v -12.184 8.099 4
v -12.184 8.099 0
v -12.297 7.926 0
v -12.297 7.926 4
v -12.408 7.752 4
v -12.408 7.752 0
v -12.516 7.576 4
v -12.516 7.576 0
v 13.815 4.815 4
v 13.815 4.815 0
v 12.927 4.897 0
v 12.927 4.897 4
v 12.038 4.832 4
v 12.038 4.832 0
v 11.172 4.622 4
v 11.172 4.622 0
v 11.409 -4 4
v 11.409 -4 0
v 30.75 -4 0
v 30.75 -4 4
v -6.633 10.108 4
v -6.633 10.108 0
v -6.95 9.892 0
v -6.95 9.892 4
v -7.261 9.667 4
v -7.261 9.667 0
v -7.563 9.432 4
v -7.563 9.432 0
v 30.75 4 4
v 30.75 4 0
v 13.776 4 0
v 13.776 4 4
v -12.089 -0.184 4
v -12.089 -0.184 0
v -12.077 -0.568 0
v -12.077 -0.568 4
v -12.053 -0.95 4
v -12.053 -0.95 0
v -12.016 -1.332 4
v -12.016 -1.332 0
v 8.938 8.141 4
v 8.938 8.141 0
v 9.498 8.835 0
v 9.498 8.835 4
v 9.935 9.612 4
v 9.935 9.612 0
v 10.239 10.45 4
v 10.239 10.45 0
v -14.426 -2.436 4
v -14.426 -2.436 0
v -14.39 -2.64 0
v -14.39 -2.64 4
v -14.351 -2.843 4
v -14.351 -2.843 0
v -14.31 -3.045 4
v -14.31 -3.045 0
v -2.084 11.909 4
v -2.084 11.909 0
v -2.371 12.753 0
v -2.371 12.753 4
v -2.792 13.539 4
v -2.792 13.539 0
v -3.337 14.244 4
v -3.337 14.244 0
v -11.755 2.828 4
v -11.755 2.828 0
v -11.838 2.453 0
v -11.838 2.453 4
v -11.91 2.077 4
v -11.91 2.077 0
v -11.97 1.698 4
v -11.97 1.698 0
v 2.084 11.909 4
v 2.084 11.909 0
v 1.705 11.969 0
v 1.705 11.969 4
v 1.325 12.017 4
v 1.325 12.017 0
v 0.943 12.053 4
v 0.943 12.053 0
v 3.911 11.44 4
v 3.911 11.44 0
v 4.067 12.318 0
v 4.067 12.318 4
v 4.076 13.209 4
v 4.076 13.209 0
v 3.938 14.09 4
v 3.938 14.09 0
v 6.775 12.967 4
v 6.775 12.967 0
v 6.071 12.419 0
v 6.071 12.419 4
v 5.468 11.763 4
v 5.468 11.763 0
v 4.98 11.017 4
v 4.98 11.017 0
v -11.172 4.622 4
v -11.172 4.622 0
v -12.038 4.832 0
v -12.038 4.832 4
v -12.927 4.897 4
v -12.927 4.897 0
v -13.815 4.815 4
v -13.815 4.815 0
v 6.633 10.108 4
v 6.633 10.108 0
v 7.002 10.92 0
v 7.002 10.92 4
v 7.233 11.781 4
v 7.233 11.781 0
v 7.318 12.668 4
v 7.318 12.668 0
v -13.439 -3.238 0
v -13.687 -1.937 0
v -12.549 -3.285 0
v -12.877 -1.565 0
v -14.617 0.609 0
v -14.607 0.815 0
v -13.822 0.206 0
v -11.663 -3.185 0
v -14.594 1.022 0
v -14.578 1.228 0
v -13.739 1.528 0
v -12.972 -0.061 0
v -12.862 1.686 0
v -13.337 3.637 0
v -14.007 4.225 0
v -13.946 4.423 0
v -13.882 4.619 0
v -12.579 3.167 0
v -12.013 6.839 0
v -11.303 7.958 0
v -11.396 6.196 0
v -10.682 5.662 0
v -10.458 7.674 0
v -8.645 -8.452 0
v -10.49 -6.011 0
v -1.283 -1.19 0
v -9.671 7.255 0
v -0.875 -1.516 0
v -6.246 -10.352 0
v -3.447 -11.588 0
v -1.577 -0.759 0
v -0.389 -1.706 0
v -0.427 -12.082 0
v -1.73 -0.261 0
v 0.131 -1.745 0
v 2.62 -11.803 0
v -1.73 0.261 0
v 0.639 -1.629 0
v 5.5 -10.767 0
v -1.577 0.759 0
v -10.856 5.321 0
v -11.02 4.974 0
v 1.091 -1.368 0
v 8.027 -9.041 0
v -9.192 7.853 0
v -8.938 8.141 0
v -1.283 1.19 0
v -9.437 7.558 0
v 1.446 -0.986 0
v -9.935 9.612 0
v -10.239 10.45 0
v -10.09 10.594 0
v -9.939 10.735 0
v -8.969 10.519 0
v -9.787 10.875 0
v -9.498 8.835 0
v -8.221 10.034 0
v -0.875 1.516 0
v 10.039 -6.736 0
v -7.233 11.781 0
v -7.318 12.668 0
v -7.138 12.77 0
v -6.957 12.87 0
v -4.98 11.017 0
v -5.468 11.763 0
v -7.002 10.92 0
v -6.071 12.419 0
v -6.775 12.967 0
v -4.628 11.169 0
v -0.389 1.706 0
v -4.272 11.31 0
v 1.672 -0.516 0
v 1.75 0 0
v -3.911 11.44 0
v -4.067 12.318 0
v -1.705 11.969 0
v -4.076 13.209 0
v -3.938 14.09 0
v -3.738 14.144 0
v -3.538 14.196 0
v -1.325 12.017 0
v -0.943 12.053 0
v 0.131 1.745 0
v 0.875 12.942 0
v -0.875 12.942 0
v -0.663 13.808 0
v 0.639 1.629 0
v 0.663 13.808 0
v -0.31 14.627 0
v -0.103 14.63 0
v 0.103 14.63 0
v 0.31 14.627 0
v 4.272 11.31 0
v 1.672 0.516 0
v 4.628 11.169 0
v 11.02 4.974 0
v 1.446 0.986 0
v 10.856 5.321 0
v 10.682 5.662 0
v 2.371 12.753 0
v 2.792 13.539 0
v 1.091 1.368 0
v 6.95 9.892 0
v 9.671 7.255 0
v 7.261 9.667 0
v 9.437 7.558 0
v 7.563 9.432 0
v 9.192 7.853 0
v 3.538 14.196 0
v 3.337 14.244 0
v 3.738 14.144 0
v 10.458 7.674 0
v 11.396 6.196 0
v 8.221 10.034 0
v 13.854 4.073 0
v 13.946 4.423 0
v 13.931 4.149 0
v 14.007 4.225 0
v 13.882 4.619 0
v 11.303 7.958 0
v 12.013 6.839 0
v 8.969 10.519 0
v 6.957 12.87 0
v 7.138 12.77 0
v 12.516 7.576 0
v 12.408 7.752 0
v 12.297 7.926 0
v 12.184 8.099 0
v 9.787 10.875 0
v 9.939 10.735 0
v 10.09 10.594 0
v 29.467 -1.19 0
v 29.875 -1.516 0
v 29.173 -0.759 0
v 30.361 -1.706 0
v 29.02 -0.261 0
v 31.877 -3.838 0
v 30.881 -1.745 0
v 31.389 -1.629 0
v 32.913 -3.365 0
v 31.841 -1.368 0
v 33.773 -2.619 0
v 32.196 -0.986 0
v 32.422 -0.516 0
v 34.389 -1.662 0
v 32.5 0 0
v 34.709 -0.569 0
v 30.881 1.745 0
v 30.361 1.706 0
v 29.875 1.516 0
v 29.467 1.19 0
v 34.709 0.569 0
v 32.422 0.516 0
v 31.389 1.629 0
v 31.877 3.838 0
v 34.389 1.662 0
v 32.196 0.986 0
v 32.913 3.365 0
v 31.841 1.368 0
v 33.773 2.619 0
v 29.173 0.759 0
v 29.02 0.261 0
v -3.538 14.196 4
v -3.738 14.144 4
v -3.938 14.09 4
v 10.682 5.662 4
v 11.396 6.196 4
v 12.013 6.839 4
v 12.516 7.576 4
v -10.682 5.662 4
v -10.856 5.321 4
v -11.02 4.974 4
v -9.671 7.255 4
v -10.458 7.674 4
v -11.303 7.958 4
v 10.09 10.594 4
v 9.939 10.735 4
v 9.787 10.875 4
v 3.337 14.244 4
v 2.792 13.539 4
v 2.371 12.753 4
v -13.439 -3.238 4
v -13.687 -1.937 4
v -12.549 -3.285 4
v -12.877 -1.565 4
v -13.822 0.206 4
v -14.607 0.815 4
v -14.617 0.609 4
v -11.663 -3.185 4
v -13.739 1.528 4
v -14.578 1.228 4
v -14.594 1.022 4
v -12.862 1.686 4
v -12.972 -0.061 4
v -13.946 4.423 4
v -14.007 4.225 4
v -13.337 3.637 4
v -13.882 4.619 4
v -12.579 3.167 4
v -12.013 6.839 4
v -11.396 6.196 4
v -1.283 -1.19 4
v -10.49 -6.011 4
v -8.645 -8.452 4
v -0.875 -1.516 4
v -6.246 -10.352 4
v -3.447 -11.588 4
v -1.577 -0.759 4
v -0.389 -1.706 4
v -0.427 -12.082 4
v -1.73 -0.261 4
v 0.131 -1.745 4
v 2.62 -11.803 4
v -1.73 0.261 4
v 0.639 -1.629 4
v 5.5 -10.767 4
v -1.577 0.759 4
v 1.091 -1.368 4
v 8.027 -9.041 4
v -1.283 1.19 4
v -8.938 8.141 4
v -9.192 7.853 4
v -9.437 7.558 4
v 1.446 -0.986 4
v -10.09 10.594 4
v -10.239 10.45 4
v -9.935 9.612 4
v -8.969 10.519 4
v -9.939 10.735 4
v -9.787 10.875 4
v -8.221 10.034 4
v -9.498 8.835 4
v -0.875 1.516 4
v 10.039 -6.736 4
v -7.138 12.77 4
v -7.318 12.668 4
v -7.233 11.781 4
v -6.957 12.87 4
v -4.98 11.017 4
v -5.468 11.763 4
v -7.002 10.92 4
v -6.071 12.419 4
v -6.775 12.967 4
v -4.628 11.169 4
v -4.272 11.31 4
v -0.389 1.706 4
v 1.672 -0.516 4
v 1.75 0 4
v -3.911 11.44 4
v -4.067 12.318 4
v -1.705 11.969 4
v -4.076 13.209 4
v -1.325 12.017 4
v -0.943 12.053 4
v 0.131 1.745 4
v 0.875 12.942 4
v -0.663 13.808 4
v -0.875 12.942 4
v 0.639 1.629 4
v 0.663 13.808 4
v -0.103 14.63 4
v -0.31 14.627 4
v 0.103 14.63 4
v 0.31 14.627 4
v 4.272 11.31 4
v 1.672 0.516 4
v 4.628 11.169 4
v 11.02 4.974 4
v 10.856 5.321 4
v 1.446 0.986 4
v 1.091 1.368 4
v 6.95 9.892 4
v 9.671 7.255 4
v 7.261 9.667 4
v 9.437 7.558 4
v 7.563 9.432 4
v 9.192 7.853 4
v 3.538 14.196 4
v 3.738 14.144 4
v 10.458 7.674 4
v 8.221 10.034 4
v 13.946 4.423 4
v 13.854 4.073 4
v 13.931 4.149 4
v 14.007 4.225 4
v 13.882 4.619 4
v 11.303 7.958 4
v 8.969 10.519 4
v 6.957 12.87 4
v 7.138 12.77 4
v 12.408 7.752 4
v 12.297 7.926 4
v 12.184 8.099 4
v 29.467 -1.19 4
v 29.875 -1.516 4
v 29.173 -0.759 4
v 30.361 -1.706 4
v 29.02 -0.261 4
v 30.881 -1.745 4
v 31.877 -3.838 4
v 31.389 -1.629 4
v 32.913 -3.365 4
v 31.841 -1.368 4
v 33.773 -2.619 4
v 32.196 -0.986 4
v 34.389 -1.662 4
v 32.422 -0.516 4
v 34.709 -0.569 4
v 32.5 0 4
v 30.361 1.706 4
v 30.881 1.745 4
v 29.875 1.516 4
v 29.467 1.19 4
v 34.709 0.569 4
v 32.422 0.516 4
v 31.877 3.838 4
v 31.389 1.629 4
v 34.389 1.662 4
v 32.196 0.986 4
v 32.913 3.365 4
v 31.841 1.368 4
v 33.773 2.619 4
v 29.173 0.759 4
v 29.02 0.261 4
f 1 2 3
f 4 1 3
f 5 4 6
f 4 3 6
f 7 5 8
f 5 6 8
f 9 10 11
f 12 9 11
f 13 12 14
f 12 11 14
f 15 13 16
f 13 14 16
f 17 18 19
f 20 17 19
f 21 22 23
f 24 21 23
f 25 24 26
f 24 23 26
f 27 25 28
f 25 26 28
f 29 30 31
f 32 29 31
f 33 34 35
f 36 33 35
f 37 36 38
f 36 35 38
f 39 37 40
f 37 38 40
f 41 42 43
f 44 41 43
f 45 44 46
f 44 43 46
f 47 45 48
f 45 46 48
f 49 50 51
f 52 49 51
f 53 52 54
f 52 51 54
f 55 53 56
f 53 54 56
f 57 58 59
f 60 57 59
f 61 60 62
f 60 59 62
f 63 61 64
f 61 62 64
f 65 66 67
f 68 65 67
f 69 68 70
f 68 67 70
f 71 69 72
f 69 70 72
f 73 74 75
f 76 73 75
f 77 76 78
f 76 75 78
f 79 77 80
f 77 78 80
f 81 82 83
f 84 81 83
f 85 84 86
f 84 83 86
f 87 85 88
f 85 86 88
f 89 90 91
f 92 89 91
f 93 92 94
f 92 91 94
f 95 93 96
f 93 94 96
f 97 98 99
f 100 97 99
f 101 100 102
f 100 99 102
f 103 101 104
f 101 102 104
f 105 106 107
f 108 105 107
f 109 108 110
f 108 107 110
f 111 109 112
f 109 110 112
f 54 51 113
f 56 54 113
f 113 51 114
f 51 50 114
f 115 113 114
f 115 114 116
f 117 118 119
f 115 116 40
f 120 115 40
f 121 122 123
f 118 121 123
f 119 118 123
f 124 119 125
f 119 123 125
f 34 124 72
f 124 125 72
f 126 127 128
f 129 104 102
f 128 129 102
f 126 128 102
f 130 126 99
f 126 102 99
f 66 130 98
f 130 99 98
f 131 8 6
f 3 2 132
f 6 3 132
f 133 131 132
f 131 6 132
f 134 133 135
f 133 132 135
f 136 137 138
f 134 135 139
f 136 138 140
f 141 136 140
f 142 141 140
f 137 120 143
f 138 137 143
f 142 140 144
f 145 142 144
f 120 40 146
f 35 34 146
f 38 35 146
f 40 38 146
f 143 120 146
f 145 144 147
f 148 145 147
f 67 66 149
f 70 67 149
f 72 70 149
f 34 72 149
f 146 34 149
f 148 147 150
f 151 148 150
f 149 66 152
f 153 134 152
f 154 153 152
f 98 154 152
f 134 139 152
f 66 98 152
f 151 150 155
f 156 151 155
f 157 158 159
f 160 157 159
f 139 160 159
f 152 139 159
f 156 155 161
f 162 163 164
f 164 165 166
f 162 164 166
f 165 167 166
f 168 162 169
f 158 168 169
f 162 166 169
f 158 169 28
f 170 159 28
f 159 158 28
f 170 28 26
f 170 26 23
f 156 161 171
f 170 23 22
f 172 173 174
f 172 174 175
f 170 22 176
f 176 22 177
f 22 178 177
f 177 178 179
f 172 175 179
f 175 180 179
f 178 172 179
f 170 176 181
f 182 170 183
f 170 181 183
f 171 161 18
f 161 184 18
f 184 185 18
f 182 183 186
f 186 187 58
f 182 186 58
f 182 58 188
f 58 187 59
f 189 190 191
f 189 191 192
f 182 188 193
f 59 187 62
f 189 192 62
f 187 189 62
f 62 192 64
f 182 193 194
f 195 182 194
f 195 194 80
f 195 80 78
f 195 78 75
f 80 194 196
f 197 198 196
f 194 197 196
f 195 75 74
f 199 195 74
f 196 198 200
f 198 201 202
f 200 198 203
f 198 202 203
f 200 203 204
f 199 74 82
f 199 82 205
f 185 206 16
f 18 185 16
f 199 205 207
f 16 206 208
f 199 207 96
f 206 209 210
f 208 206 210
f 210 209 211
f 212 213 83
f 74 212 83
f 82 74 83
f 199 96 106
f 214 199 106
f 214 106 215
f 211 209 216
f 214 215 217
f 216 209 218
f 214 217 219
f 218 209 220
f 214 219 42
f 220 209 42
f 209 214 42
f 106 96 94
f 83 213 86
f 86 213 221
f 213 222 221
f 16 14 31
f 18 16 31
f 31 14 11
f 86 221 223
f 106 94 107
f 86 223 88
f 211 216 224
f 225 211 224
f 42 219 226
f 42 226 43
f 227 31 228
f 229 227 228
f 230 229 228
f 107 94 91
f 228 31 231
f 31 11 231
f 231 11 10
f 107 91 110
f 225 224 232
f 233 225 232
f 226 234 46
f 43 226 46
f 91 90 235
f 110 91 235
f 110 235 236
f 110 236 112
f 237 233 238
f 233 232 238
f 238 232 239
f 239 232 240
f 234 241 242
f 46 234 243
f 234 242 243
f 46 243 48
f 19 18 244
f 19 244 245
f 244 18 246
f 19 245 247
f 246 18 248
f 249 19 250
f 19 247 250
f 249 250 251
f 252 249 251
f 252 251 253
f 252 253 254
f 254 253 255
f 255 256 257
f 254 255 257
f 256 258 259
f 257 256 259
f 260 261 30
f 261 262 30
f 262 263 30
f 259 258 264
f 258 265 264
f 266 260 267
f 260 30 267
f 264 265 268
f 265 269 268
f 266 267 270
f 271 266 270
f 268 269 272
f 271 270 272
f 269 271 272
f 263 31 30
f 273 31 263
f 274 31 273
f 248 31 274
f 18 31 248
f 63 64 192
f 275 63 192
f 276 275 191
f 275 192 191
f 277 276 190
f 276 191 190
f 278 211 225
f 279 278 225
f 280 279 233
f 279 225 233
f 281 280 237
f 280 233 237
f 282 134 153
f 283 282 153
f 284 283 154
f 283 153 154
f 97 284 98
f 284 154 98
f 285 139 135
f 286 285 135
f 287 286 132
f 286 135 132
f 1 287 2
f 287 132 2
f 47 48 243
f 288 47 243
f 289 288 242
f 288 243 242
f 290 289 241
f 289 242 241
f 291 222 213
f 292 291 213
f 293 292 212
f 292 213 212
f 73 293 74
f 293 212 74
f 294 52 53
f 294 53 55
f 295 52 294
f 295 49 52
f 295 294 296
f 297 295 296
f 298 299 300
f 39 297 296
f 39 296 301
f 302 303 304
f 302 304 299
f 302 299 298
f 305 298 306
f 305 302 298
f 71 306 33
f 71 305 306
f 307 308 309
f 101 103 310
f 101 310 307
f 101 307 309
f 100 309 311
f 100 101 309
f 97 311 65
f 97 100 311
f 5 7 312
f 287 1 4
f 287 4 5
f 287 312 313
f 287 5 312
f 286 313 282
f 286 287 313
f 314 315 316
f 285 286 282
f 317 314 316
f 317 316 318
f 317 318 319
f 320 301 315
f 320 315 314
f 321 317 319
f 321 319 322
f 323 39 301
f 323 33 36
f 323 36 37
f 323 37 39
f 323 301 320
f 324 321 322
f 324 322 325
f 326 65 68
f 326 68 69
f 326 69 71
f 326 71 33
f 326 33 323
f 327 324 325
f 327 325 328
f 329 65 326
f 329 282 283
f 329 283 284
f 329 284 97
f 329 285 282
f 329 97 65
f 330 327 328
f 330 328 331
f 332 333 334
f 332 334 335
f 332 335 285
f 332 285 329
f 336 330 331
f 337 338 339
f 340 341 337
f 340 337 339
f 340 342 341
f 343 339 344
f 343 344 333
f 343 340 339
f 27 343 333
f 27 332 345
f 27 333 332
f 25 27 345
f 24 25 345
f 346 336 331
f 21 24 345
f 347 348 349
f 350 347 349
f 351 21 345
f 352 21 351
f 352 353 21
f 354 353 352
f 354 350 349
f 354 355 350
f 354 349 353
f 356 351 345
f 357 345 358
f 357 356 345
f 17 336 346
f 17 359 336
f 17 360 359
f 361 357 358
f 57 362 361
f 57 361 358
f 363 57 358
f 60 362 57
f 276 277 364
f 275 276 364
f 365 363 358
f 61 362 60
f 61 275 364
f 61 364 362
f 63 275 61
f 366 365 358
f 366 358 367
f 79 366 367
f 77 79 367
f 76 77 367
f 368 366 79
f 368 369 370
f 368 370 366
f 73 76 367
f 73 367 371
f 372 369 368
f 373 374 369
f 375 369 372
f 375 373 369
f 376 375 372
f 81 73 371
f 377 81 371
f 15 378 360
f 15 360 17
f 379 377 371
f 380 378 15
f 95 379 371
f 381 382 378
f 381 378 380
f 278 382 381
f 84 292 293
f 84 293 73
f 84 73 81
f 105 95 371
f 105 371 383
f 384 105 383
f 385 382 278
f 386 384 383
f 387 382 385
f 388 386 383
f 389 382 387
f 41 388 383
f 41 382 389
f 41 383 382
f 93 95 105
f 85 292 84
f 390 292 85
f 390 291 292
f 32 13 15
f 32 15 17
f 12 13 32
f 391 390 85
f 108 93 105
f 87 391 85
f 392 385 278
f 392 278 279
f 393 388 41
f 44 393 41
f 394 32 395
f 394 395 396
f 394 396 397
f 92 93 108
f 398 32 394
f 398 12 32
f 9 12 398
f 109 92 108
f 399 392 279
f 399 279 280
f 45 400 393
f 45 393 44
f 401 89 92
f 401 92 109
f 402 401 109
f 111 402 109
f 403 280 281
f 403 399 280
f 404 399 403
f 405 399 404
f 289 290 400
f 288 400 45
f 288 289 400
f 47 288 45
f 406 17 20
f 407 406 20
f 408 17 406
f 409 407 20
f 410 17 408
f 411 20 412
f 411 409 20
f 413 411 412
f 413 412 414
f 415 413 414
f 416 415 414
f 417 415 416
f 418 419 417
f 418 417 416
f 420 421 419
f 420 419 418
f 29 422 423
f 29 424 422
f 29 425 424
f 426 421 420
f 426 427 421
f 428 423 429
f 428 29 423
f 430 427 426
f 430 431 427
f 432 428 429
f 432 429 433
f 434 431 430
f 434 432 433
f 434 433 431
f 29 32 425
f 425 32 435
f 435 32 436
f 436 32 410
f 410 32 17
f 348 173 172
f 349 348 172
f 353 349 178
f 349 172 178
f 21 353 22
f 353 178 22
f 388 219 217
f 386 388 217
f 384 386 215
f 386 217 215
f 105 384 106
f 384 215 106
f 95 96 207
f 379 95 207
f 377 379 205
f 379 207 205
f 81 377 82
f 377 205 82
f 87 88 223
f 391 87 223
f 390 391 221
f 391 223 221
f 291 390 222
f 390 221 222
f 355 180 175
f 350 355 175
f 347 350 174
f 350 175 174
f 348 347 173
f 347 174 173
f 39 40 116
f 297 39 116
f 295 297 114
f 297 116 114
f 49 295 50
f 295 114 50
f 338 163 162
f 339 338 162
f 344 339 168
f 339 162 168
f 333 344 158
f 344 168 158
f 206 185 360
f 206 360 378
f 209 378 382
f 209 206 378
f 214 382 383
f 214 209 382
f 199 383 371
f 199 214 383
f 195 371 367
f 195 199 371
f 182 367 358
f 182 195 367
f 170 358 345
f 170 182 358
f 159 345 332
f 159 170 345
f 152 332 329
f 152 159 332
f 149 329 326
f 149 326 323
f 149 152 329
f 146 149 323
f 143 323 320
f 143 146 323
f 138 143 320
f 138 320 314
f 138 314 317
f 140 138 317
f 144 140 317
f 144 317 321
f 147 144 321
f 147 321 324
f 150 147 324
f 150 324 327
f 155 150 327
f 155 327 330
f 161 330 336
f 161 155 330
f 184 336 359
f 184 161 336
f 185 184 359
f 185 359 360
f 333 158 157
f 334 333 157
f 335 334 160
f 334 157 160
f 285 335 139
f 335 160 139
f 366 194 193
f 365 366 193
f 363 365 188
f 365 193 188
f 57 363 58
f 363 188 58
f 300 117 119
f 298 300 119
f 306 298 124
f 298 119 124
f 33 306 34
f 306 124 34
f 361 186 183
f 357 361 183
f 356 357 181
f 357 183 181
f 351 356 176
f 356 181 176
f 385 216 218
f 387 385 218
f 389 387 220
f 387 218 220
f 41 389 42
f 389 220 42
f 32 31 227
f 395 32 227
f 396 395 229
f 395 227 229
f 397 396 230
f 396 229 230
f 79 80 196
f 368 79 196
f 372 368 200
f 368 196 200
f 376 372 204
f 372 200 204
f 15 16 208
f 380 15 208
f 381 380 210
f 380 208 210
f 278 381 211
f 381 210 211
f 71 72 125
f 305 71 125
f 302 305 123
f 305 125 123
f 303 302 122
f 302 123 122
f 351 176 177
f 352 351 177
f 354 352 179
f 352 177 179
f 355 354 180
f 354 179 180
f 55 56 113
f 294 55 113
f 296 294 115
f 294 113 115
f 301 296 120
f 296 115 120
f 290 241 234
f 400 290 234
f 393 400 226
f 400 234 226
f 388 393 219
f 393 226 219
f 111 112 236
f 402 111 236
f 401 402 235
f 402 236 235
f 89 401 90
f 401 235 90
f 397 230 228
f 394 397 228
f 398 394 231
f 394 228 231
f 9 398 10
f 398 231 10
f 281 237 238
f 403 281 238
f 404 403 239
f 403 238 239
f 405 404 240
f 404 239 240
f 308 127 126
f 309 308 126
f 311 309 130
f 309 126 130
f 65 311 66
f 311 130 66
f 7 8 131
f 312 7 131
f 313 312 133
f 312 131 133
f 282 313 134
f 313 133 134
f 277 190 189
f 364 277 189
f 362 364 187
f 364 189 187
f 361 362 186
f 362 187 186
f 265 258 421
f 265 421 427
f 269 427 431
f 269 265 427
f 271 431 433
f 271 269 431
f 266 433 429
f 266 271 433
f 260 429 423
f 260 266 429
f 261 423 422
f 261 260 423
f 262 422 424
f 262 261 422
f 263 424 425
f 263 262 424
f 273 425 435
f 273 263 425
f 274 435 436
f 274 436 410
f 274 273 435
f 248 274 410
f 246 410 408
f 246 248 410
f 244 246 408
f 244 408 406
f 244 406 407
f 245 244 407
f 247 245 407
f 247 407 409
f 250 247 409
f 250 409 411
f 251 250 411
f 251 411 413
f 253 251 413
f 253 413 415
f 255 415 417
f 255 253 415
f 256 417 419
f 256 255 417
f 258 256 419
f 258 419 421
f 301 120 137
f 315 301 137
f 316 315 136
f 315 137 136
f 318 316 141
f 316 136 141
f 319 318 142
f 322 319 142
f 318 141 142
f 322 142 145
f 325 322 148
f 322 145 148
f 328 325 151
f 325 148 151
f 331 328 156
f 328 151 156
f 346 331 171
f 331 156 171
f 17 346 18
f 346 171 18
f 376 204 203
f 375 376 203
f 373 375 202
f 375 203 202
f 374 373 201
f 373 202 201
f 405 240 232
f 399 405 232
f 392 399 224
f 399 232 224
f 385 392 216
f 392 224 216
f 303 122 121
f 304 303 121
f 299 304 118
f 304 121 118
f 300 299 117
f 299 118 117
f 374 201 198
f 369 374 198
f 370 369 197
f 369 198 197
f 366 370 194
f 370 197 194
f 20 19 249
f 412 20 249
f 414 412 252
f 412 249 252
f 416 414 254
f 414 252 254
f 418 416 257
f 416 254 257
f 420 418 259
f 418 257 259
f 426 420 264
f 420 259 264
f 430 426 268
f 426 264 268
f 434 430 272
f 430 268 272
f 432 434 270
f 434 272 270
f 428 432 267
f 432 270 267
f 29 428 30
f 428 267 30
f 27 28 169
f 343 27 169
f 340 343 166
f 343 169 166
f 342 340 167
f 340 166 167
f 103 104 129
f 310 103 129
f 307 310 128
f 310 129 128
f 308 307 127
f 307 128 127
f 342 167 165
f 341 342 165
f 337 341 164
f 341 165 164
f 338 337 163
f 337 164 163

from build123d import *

# Parameters (mm, degrees)
SKETCH1_R           = 1.75
BOSS_EXTRUDE1_DEPTH = 4


with BuildPart() as part:
    # Sketch1 → Boss-Extrude1 (new body)
    with BuildSketch(Plane.XY):
        with BuildLine():
            ThreePointArc((13.776114953, 4), (13.893050478, 4.110818553), (14.006628151, 4.225076075))
            ThreePointArc((14.006628151, 4.225076075), (13.913956833, 4.520918628), (13.815037615, 4.814731115))
            ThreePointArc((13.815037615, 4.814731115), (12.481386111, 4.882828881), (11.171803009, 4.621570895))
            ThreePointArc((11.171803009, 4.621570895), (10.939359064, 5.147671635), (10.682156823, 5.662122005))
            ThreePointArc((10.682156823, 5.662122005), (11.718219248, 6.50464102), (12.515850479, 7.575644315))
            ThreePointArc((12.515850479, 7.575644315), (12.35251755, 7.839146011), (12.183637866, 8.099127629))
            ThreePointArc((12.183637866, 8.099127629), (10.874950252, 7.833420336), (9.671482329, 7.254690176))
            ThreePointArc((9.671482329, 7.254690176), (9.315505105, 7.706456036), (8.938444741, 8.140780406))
            ThreePointArc((8.938444741, 8.140780406), (9.7324314, 9.214488384), (10.238655891, 10.450206961))
            ThreePointArc((10.238655891, 10.450206961), (10.01492416, 10.664811019), (9.786695342, 10.874626167))
            ThreePointArc((9.786695342, 10.874626167), (8.585201272, 10.291809183), (7.563466846, 9.431970593))
            ThreePointArc((7.563466846, 9.431970593), (7.1063237, 9.781015462), (6.633097302, 10.107923633))
            ThreePointArc((6.633097302, 10.107923633), (7.135119095, 11.345355554), (7.318128899, 12.668144672))
            ThreePointArc((7.318128899, 12.668144672), (7.048056252, 12.820366729), (6.774818757, 12.966831949))
            ThreePointArc((6.774818757, 12.966831949), (5.756012523, 12.103525808), (4.980210924, 11.016605609))
            ThreePointArc((4.980210924, 11.016605609), (4.450625842, 11.240997714), (3.910967965, 11.439948845))
            ThreePointArc((3.910967965, 11.439948845), (4.089481015, 12.763352309), (3.937776954, 14.090096262))
            ThreePointArc((3.937776954, 14.090096262), (3.638333049, 14.170371647), (3.337255394, 14.244283992))
            ThreePointArc((3.337255394, 14.244283992), (2.565152337, 13.154733392), (2.084030034, 11.909026779))
            ThreePointArc((2.084030034, 11.909026779), (1.515278794, 11.994666739), (0.943098128, 12.053159997))
            ThreePointArc((0.943098128, 12.053159997), (0.786885803, 13.379380698), (0.31, 14.626715284))
            ThreePointArc((0.31, 14.626715284), (0, 14.63), (-0.31, 14.626715284))
            ThreePointArc((-0.31, 14.626715284), (-0.786885803, 13.379380698), (-0.943098128, 12.053159997))
            ThreePointArc((-0.943098128, 12.053159997), (-1.515278794, 11.994666739), (-2.084030034, 11.909026779))
            ThreePointArc((-2.084030034, 11.909026779), (-2.565152337, 13.154733392), (-3.337255394, 14.244283992))
            ThreePointArc((-3.337255394, 14.244283992), (-3.638333049, 14.170371647), (-3.937776954, 14.090096262))
            ThreePointArc((-3.937776954, 14.090096262), (-4.089481015, 12.763352309), (-3.910967965, 11.439948845))
            ThreePointArc((-3.910967965, 11.439948845), (-4.450625842, 11.240997714), (-4.980210924, 11.016605609))
            ThreePointArc((-4.980210924, 11.016605609), (-5.756012523, 12.103525808), (-6.774818757, 12.966831949))
            ThreePointArc((-6.774818757, 12.966831949), (-7.048056252, 12.820366729), (-7.318128899, 12.668144672))
            ThreePointArc((-7.318128899, 12.668144672), (-7.135119095, 11.345355554), (-6.633097302, 10.107923633))
            ThreePointArc((-6.633097302, 10.107923633), (-7.1063237, 9.781015462), (-7.563466846, 9.431970593))
            ThreePointArc((-7.563466846, 9.431970593), (-8.585201272, 10.291809183), (-9.786695342, 10.874626167))
            ThreePointArc((-9.786695342, 10.874626167), (-10.01492416, 10.664811019), (-10.238655891, 10.450206961))
            ThreePointArc((-10.238655891, 10.450206961), (-9.7324314, 9.214488384), (-8.938444741, 8.140780406))
            ThreePointArc((-8.938444741, 8.140780406), (-9.315505105, 7.706456036), (-9.671482329, 7.254690176))
            ThreePointArc((-9.671482329, 7.254690176), (-10.874950252, 7.833420336), (-12.183637866, 8.099127629))
            ThreePointArc((-12.183637866, 8.099127629), (-12.35251755, 7.839146011), (-12.515850479, 7.575644315))
            ThreePointArc((-12.515850479, 7.575644315), (-11.718219248, 6.50464102), (-10.682156823, 5.662122005))
            ThreePointArc((-10.682156823, 5.662122005), (-10.939359064, 5.147671635), (-11.171803009, 4.621570895))
            ThreePointArc((-11.171803009, 4.621570895), (-12.481386111, 4.882828881), (-13.815037615, 4.814731115))
            ThreePointArc((-13.815037615, 4.814731115), (-13.913956833, 4.520918628), (-14.006628151, 4.225076075))
            ThreePointArc((-14.006628151, 4.225076075), (-12.967708283, 3.386083139), (-11.754669706, 2.827691655))
            ThreePointArc((-11.754669706, 2.827691655), (-11.875852861, 2.265440093), (-11.970158218, 1.698061317))
            ThreePointArc((-11.970158218, 1.698061317), (-13.303570578, 1.625431329), (-14.578387742, 1.227807338))
            ThreePointArc((-14.578387742, 1.227807338), (-14.601131037, 0.918625301), (-14.617317864, 0.609030766))
            ThreePointArc((-14.617317864, 0.609030766), (-13.402388515, 0.054765201), (-12.088593461, -0.184412961))
            ThreePointArc((-12.088593461, -0.184412961), (-12.066143147, -0.759137381), (-12.016384363, -1.332143698))
            ThreePointArc((-12.016384363, -1.332143698), (-13.289842779, -1.734098051), (-14.425724151, -2.43626409))
            ThreePointArc((-14.425724151, -2.43626409), (-14.370862478, -2.741388632), (-14.309547736, -3.045282186))
            ThreePointArc((-14.309547736, -3.045282186), (-12.994947386, -3.279993836), (-11.662946429, -3.184930232))
            ThreePointArc((-11.662946429, -3.184930232), (-0.426838607, -12.082462862), (11.409123542, -4))
            Line((11.409123542, -4), (30.75, -4))
            ThreePointArc((30.75, -4), (34.75, 0), (30.75, 4))
            Line((30.75, 4), (13.776114953, 4))
        make_face()
        Circle(SKETCH1_R, mode=Mode.SUBTRACT)
        with Locations((30.75, 0)):
            Circle(SKETCH1_R, mode=Mode.SUBTRACT)
    extrude(amount=BOSS_EXTRUDE1_DEPTH)


solid = part.part
